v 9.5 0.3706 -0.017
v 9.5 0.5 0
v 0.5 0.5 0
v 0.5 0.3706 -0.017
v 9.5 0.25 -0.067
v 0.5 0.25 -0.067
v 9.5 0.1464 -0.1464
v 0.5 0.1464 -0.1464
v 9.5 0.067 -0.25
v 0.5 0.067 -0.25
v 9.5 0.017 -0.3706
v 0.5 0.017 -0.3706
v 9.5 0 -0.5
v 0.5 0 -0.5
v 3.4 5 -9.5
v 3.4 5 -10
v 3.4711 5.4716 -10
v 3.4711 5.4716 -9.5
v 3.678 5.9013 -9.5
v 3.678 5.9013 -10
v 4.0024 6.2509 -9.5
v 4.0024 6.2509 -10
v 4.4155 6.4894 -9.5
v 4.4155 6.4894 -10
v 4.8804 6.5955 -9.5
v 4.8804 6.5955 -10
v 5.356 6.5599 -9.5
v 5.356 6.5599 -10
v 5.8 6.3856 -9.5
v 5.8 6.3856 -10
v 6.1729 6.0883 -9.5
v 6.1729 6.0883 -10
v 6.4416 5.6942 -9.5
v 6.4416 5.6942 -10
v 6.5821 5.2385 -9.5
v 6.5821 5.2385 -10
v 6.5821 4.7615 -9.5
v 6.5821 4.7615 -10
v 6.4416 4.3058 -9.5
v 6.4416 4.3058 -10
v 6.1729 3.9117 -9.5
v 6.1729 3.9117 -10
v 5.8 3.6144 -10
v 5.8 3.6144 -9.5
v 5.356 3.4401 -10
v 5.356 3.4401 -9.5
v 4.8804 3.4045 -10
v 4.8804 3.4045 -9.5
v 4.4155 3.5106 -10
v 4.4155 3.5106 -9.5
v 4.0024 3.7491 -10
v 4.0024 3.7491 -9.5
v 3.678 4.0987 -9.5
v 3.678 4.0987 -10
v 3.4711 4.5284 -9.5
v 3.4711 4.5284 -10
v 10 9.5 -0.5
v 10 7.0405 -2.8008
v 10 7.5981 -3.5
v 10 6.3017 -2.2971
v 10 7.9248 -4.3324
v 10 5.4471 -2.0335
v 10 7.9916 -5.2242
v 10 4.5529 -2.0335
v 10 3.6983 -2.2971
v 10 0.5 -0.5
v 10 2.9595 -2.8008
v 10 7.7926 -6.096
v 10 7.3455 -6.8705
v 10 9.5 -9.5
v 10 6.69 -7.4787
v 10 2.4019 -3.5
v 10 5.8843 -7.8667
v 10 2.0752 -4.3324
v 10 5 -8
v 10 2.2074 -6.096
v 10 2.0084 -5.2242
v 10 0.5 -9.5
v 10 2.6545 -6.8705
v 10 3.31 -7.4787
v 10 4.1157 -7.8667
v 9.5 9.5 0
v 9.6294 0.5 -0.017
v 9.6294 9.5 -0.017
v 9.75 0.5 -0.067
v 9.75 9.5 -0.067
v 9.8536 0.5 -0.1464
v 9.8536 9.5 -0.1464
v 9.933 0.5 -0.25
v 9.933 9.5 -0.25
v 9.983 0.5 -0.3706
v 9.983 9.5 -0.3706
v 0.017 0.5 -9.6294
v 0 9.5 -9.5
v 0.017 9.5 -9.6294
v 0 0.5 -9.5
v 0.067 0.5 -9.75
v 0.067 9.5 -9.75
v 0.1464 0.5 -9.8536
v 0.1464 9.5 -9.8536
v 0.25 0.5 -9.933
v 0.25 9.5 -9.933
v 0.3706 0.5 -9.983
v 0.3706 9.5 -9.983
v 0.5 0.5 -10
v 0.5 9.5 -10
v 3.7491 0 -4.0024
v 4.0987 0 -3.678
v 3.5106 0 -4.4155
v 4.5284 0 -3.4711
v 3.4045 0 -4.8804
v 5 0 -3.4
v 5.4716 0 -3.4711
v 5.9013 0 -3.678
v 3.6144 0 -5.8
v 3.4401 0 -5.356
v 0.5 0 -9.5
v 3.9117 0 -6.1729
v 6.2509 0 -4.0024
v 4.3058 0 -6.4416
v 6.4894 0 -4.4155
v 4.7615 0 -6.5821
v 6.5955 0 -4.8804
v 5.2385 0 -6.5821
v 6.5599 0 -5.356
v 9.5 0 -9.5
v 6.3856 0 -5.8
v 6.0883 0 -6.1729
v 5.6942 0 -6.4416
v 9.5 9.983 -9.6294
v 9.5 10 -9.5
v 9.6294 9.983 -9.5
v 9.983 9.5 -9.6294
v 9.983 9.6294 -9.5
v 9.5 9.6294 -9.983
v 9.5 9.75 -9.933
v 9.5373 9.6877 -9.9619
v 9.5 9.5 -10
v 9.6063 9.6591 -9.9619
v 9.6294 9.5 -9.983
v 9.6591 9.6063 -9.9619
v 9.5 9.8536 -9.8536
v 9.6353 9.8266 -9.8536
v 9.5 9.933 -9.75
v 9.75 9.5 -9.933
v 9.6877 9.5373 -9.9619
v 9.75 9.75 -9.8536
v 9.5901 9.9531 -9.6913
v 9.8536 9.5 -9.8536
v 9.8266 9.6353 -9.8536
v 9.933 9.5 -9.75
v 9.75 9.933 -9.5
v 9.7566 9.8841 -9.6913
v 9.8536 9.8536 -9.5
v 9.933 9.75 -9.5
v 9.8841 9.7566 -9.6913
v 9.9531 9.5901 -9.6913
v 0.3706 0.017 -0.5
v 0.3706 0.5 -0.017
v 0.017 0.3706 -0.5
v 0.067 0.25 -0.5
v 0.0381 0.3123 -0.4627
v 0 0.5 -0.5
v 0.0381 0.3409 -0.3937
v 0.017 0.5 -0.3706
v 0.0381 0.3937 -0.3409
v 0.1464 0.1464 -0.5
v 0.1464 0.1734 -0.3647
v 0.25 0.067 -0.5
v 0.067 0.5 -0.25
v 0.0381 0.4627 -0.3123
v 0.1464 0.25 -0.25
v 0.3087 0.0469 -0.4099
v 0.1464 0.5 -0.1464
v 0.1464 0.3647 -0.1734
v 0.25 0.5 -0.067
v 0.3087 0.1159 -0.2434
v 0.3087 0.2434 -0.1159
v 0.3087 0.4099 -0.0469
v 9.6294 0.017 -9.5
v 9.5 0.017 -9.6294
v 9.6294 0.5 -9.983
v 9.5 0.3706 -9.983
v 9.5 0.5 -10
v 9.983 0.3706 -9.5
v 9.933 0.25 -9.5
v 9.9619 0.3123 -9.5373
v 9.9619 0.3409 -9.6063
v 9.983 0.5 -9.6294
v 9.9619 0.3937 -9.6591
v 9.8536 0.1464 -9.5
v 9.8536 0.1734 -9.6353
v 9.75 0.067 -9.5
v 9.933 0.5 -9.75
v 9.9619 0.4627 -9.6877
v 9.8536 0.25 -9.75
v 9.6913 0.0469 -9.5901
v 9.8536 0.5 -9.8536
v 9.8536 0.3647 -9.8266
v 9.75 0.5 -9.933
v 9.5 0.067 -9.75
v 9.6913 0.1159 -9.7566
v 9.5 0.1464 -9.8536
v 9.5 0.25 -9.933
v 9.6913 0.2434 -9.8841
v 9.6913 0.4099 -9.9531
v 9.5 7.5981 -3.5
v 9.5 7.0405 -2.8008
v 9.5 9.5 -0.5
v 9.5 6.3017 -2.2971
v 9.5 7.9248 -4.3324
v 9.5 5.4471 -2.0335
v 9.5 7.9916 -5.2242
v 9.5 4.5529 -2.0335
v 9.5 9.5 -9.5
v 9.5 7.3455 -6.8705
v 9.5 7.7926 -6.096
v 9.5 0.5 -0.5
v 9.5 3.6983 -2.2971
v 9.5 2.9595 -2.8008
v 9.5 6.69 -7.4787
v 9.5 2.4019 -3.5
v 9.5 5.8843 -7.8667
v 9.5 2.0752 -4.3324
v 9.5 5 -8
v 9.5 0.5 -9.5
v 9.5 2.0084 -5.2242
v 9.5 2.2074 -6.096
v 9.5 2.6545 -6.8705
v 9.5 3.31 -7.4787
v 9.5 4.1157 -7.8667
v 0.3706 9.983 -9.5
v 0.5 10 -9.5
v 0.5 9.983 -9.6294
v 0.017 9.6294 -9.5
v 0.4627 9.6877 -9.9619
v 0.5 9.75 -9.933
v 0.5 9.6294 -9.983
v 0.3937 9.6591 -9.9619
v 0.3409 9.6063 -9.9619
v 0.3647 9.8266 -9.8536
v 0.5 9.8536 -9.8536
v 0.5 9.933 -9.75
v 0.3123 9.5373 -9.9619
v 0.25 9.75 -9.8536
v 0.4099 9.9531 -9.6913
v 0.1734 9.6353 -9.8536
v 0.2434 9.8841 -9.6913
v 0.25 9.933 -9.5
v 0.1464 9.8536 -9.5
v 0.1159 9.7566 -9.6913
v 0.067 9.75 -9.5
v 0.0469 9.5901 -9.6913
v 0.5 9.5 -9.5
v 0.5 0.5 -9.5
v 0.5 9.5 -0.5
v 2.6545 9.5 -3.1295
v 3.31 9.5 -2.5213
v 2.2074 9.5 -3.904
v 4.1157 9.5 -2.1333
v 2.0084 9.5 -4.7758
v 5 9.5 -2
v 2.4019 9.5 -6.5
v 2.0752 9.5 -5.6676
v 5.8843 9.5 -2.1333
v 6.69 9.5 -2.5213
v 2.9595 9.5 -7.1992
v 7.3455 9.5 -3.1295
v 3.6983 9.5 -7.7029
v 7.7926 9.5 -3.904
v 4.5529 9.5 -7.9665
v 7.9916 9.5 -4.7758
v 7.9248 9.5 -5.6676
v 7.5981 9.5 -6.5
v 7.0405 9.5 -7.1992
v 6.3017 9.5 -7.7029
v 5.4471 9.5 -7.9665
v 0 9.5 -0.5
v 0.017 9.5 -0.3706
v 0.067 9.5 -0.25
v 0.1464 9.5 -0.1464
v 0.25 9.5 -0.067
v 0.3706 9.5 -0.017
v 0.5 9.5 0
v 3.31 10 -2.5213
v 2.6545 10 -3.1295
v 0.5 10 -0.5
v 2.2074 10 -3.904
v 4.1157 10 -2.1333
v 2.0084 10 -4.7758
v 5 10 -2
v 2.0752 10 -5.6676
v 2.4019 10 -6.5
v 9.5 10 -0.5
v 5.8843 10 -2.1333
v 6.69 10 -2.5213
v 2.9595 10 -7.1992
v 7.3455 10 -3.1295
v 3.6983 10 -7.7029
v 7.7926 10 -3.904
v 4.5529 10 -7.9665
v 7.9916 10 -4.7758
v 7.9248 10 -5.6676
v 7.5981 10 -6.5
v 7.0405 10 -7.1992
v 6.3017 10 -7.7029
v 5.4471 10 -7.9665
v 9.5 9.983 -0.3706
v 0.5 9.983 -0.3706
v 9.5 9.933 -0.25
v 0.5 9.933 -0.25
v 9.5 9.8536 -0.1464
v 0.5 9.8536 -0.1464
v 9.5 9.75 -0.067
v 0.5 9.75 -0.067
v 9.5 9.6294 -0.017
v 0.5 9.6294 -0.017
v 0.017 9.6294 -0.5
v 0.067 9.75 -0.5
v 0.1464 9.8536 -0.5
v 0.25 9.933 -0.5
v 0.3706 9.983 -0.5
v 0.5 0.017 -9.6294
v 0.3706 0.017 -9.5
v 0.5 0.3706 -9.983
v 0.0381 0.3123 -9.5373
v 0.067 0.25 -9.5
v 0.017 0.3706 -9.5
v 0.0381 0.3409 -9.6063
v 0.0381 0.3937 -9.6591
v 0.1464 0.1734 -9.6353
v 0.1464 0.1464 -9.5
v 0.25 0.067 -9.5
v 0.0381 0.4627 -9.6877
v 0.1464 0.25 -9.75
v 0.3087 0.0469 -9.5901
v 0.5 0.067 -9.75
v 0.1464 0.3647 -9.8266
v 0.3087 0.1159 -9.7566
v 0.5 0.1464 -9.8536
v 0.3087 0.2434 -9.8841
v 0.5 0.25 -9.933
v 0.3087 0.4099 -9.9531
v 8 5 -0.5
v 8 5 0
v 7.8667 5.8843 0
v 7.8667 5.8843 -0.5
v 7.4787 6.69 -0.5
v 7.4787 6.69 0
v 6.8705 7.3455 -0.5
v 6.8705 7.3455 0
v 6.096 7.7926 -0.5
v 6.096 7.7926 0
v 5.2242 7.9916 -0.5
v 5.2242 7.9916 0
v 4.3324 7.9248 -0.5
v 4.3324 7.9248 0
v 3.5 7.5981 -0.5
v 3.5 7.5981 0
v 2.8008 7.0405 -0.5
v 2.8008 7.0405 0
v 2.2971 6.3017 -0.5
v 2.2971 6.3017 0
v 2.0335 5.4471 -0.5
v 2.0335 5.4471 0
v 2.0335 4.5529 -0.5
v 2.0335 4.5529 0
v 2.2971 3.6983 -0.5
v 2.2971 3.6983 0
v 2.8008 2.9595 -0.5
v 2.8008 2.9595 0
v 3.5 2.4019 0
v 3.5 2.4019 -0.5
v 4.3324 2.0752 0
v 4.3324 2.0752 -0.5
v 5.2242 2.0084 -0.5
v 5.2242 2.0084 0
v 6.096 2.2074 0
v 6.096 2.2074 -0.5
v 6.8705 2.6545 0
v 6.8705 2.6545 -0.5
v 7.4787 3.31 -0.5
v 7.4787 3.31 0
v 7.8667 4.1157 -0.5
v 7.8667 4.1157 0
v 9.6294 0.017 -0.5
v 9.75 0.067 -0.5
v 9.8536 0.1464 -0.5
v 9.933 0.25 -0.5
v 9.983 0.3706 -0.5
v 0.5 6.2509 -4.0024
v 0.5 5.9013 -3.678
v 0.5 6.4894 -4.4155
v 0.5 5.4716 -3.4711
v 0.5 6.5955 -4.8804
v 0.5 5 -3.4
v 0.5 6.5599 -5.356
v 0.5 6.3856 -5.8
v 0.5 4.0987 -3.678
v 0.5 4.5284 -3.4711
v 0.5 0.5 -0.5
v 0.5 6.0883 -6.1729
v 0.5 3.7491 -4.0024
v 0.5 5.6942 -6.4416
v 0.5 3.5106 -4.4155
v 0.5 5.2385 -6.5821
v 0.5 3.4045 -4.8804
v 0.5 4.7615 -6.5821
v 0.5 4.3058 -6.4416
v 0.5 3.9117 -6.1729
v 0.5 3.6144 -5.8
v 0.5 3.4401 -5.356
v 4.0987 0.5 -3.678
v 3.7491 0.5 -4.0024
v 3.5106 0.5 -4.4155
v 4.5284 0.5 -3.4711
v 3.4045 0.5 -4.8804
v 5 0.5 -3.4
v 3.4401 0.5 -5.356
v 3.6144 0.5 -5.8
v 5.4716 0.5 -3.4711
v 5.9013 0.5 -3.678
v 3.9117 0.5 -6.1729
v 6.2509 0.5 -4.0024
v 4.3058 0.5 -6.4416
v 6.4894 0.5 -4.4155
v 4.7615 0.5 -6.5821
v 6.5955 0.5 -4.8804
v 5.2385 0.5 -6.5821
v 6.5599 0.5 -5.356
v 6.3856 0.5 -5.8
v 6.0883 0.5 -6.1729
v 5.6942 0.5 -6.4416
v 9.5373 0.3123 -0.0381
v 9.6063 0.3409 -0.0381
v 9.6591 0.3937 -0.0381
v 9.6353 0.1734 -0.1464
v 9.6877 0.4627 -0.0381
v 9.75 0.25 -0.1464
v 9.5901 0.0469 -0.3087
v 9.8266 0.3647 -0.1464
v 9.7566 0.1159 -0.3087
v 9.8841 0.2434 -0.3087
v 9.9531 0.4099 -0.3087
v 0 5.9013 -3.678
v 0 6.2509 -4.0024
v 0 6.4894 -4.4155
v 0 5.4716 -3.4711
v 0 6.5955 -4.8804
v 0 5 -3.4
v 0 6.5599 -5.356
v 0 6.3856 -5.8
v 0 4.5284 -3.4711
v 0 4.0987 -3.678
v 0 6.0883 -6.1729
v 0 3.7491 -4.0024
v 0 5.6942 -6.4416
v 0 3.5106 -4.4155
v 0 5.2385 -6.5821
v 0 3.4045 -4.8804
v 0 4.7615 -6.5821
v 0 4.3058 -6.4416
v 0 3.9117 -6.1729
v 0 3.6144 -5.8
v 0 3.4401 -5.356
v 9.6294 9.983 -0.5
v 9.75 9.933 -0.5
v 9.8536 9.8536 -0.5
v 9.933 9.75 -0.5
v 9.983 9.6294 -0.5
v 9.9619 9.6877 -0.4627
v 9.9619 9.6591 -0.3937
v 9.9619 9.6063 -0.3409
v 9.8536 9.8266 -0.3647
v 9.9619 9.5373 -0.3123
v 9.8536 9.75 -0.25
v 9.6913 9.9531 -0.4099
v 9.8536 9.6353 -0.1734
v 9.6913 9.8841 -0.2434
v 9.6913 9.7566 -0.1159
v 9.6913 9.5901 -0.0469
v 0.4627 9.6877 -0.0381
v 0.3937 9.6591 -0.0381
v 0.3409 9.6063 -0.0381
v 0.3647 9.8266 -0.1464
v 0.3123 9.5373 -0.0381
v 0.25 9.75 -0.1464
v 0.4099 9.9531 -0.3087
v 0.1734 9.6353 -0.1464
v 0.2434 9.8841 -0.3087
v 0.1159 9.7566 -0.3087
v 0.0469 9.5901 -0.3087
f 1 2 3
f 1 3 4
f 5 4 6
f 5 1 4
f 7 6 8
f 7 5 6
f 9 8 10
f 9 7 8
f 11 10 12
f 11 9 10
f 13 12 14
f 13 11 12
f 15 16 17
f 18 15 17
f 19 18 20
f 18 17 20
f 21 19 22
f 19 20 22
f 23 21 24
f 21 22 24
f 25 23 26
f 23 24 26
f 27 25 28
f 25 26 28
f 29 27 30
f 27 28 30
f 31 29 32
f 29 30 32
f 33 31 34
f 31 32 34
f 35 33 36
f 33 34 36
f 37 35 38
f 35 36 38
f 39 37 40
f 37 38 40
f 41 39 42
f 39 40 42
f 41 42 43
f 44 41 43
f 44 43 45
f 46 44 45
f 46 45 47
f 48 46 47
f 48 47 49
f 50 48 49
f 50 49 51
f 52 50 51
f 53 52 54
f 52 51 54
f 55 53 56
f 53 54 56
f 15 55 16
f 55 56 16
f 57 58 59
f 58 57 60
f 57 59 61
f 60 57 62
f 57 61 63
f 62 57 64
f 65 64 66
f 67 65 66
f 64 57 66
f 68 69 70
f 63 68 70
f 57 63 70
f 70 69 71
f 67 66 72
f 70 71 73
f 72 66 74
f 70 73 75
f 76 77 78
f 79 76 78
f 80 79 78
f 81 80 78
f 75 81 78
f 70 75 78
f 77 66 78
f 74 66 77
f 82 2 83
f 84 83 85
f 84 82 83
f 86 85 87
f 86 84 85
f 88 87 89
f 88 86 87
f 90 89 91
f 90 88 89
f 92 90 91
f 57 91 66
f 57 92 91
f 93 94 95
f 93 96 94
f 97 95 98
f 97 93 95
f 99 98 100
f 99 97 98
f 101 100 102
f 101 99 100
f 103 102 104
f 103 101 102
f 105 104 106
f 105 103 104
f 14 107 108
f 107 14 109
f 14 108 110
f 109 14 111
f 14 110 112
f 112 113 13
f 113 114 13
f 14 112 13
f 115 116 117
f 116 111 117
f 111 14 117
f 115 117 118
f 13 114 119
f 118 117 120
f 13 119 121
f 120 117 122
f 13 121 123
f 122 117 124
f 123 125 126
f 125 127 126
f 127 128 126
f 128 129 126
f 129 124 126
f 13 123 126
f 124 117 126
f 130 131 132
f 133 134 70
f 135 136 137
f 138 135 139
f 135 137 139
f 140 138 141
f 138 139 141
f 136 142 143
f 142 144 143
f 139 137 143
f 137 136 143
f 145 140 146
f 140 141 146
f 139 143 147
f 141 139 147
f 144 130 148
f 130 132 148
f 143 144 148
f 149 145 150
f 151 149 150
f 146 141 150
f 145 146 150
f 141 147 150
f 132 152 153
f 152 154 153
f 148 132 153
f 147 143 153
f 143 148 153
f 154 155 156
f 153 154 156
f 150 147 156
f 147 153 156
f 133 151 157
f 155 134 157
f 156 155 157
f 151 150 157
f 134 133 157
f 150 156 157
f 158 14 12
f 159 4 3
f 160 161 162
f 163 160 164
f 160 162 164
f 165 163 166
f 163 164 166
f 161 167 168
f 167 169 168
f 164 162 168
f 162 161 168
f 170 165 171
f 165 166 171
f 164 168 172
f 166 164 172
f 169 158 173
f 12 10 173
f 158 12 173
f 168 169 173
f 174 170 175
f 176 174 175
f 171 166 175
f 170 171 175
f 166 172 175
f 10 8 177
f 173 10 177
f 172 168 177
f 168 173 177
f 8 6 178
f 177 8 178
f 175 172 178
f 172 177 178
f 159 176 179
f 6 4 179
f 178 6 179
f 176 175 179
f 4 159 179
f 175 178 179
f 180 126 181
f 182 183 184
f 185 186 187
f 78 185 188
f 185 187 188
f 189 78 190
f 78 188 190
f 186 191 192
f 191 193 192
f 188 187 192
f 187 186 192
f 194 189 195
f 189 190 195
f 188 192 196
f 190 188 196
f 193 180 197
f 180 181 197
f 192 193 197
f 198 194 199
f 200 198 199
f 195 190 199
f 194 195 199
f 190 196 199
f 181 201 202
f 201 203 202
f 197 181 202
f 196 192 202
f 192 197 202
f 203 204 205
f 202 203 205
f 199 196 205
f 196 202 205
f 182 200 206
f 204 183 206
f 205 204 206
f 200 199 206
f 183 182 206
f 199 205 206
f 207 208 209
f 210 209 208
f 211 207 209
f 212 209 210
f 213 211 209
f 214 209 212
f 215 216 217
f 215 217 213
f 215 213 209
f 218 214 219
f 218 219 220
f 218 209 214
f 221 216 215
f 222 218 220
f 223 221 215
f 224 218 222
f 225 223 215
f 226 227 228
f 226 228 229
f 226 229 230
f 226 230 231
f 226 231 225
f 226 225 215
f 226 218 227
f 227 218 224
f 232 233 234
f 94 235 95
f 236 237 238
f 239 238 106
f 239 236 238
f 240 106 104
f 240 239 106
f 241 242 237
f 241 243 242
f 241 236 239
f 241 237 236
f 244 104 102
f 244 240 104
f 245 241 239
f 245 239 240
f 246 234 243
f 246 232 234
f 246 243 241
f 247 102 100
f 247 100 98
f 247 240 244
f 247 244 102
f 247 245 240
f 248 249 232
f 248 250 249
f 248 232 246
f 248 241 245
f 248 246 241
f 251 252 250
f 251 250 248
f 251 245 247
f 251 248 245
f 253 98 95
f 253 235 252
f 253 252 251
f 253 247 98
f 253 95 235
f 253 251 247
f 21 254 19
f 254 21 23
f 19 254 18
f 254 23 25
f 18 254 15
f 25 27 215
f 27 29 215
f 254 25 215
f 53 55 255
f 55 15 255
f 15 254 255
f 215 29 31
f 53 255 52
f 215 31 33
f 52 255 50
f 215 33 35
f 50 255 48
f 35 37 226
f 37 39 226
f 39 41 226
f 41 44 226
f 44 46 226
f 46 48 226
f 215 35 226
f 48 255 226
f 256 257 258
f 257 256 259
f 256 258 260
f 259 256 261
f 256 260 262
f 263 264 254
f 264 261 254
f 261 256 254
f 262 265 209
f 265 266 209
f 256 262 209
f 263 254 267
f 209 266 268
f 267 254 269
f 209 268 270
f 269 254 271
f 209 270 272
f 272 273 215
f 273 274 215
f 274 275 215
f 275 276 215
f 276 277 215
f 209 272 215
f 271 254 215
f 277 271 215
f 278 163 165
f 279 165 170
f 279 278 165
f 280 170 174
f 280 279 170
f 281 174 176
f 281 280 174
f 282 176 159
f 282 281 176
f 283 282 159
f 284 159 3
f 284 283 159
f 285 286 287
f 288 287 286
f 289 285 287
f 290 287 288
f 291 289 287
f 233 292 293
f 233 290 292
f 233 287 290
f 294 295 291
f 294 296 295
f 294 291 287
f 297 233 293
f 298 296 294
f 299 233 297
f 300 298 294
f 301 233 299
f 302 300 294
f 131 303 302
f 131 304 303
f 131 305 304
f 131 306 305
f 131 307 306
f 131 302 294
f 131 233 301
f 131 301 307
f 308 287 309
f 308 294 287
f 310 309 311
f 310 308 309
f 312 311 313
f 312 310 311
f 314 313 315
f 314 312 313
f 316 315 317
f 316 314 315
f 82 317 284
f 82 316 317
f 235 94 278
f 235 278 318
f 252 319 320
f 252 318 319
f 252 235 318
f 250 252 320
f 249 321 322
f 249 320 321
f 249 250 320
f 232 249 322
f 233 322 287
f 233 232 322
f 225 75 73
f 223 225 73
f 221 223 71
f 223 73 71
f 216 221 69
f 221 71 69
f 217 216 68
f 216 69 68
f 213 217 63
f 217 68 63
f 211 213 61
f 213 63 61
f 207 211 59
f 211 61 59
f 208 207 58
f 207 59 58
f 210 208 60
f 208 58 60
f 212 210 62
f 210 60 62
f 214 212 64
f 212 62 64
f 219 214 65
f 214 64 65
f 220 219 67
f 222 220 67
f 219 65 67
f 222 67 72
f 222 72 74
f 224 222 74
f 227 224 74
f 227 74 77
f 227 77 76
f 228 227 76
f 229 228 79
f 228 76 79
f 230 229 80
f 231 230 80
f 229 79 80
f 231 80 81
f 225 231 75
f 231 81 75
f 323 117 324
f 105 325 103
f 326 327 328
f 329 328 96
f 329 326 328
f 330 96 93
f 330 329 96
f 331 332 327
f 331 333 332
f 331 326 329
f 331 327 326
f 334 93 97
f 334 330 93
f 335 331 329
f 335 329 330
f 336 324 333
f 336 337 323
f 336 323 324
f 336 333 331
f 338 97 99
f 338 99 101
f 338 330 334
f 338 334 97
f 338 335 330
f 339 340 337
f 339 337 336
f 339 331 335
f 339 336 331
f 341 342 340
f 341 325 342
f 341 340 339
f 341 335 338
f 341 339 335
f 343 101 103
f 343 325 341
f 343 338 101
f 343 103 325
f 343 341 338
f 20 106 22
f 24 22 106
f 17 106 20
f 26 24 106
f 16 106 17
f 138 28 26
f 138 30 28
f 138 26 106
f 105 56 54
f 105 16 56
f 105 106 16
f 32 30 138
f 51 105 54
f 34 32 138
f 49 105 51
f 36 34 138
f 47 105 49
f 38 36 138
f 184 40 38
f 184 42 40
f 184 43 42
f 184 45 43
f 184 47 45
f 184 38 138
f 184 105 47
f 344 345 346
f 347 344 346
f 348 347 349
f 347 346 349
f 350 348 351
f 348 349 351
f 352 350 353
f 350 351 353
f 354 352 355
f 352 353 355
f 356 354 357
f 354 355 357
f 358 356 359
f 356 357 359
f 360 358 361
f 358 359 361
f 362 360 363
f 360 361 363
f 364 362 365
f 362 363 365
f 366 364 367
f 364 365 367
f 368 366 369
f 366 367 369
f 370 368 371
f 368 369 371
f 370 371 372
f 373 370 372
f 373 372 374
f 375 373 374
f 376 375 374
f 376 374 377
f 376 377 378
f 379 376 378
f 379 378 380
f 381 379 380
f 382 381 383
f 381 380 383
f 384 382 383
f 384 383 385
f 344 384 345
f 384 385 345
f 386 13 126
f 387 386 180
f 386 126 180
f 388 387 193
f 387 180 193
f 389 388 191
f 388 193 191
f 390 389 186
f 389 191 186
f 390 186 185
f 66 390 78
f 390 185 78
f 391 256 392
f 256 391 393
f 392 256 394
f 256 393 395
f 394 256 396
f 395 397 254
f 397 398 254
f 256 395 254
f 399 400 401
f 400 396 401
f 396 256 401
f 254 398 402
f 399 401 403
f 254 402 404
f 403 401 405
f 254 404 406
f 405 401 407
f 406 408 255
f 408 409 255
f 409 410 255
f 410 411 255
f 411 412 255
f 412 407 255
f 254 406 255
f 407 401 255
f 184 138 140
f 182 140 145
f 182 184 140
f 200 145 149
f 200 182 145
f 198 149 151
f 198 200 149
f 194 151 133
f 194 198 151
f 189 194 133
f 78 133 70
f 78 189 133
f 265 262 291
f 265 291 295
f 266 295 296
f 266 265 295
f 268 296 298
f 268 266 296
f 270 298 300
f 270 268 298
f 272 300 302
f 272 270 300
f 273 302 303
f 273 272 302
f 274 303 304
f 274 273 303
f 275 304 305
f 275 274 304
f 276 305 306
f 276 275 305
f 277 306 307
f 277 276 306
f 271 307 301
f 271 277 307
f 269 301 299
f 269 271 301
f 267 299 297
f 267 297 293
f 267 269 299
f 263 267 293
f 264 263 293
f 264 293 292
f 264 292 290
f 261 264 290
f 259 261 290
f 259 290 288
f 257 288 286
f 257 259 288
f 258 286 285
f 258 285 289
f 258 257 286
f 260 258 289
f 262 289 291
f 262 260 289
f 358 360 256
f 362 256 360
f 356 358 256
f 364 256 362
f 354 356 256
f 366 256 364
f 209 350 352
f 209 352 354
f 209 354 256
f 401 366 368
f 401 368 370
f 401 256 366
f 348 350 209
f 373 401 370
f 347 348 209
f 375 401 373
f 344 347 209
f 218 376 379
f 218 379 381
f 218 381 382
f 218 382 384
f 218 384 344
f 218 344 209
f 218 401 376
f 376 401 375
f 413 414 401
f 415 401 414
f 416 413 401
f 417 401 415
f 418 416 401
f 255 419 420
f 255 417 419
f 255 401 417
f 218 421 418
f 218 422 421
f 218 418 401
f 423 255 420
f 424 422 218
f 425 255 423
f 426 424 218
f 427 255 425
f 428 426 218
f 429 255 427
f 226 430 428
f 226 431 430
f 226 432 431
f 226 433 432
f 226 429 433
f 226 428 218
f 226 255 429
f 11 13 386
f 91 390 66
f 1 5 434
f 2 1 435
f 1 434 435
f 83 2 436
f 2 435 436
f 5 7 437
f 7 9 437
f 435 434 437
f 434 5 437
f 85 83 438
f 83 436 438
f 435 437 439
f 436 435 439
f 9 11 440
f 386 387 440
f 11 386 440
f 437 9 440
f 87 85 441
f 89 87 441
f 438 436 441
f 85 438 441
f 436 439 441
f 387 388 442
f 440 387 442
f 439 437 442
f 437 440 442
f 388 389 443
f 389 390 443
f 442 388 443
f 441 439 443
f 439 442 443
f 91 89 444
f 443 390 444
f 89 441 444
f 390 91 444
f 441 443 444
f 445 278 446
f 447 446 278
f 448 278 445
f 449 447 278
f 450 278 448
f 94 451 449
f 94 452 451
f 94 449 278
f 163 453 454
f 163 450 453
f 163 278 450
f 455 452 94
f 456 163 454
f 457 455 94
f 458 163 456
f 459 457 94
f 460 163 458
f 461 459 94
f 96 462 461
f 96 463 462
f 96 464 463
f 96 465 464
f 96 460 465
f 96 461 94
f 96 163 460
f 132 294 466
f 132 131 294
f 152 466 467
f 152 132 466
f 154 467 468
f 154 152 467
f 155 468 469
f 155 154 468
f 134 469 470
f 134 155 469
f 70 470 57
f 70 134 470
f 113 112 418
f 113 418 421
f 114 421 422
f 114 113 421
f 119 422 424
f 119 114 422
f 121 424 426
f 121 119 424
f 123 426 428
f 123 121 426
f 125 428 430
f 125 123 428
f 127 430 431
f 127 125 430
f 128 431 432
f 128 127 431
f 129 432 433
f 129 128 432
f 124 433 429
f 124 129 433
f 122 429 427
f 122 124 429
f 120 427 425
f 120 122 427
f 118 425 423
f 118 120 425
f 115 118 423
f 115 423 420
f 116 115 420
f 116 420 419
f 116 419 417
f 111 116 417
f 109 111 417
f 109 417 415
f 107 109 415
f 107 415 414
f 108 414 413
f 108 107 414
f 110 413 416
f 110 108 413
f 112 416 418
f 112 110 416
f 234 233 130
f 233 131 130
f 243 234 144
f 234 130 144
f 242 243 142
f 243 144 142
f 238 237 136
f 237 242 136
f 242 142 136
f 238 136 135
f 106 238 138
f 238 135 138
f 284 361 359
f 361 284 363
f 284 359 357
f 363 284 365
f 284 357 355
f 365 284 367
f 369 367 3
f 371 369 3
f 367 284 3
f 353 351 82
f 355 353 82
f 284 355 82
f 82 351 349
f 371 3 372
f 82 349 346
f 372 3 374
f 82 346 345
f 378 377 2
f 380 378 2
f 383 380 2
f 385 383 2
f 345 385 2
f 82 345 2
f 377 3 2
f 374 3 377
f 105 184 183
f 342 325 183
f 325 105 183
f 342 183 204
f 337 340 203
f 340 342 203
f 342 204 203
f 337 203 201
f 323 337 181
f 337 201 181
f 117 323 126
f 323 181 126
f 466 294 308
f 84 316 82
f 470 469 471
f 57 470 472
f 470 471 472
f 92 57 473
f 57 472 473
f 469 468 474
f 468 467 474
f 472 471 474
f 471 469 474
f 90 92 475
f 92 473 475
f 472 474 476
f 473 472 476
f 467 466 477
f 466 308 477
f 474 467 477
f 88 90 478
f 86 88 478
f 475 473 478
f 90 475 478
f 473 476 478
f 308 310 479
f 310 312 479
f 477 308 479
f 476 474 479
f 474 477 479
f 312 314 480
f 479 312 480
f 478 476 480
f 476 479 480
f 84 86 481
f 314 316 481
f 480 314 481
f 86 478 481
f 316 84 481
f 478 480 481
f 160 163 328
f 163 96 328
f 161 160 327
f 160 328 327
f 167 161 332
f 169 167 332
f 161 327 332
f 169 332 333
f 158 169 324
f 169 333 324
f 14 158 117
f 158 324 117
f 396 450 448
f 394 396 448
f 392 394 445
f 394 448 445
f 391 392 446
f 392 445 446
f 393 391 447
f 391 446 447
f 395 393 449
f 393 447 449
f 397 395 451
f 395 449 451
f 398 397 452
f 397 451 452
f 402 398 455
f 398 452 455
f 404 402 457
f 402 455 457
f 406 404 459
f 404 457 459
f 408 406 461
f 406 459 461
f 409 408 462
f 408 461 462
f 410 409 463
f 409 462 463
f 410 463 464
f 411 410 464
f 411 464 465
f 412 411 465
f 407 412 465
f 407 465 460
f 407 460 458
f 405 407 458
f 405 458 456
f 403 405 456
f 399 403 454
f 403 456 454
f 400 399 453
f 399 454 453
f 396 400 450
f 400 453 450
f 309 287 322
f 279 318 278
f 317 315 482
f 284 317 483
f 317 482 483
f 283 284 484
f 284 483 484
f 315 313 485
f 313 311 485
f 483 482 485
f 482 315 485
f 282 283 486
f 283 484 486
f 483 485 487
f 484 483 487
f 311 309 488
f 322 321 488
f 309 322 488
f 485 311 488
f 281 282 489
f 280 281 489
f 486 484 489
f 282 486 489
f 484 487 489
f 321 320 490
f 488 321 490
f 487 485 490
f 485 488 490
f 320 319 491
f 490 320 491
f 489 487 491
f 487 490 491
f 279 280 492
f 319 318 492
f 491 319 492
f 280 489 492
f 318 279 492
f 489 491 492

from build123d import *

# Parameters (mm, degrees)
SKETCH1_W           = 10
SKETCH1_H           = 10
SKETCH1_R           = 1.6
BOSS_EXTRUDE1_DEPTH = 0.5
SKETCH4_W           = 10
SKETCH4_H           = 10
SKETCH4_W_2         = 9
SKETCH4_H_2         = 9
BOSS_EXTRUDE2_DEPTH = 9
SKETCH5_W           = 10
SKETCH5_H           = 10
SKETCH5_R           = 3
BOSS_EXTRUDE3_DEPTH = 0.5
SKETCH6_R           = 3
CUT_EXTRUDE1_DEPTH  = 0.5
SKETCH7_R           = 3
CUT_EXTRUDE2_DEPTH  = 0.5
SKETCH8_R           = 1.6
CUT_EXTRUDE3_DEPTH  = 0.5
SKETCH9_R           = 1.6
CUT_EXTRUDE4_DEPTH  = 0.5
FILLET5_R           = 0.5


with BuildPart() as part:
    # Sketch1 → Boss-Extrude1 (new body)
    with BuildSketch(Plane(origin=(0, 0, 0), x_dir=(1, 0, 0), z_dir=(0, 1, 0))):
        with Locations((5, 5)):
            Rectangle(SKETCH1_W, SKETCH1_H)
        with Locations(Location((5, 5, 0), (0, 0, 270))):
            Circle(SKETCH1_R, mode=Mode.SUBTRACT)
    extrude(amount=BOSS_EXTRUDE1_DEPTH)

    # Sketch4 → Boss-Extrude2 (add)
    with BuildSketch(Plane(origin=(0, 0.5, 0), x_dir=(1, 0, 0), z_dir=(0, 1, 0))):
        with Locations((5, 5)):
            Rectangle(SKETCH4_W, SKETCH4_H)
        with Locations((5, 5)):
            Rectangle(SKETCH4_W_2, SKETCH4_H_2, mode=Mode.SUBTRACT)
    extrude(amount=BOSS_EXTRUDE2_DEPTH)

    # Sketch5 → Boss-Extrude3 (add)
    with BuildSketch(Plane(origin=(0, 9.5, 0), x_dir=(1, 0, 0), z_dir=(0, 1, 0))):
        with Locations((5, 5)):
            Rectangle(SKETCH5_W, SKETCH5_H)
        with Locations(Location((5, 5, 0), (0, 0, 270))):
            Circle(SKETCH5_R, mode=Mode.SUBTRACT)
    extrude(amount=BOSS_EXTRUDE3_DEPTH)

    # Sketch6 → Cut-Extrude1 (cut)
    with BuildSketch(Plane(origin=(10, 0, 0), x_dir=(0, 0, -1), z_dir=(1, 0, 0))):
        with Locations((5, 5)):
            Circle(SKETCH6_R)
    extrude(amount=-CUT_EXTRUDE1_DEPTH, mode=Mode.SUBTRACT)

    # Sketch7 → Cut-Extrude2 (cut)
    with BuildSketch(Plane.XY):
        with Locations((5, 5)):
            Circle(SKETCH7_R)
    extrude(amount=-CUT_EXTRUDE2_DEPTH, mode=Mode.SUBTRACT)

    # Sketch8 → Cut-Extrude3 (cut)
    with BuildSketch(Plane.ZY):
        with Locations((-5, 5)):
            Circle(SKETCH8_R)
    extrude(amount=-CUT_EXTRUDE3_DEPTH, mode=Mode.SUBTRACT)

    # Sketch9 → Cut-Extrude4 (cut)
    with BuildSketch(Plane(origin=(0, 0, -10), x_dir=(-1, 0, 0), z_dir=(0, 0, -1))):
        with Locations((-5, 5)):
            Circle(SKETCH9_R)
    extrude(amount=-CUT_EXTRUDE4_DEPTH, mode=Mode.SUBTRACT)

    # Fillet5
    fillet5_edges = [part.edges().sort_by_distance(p)[0] for p in [
        (0, 10, -5),
        (5, 10, 0),
        (10, 10, -5),
        (5, 10, -10),
        (5, 0, -10),
        (10, 0, -5),
        (5, 0, 0),
        (0, 0, -5),
        (0, 5, -10),
        (10, 5, -10),
        (10, 5, 0),
        (0, 5, 0),
    ]]
    fillet(fillet5_edges, radius=FILLET5_R)


solid = part.part
